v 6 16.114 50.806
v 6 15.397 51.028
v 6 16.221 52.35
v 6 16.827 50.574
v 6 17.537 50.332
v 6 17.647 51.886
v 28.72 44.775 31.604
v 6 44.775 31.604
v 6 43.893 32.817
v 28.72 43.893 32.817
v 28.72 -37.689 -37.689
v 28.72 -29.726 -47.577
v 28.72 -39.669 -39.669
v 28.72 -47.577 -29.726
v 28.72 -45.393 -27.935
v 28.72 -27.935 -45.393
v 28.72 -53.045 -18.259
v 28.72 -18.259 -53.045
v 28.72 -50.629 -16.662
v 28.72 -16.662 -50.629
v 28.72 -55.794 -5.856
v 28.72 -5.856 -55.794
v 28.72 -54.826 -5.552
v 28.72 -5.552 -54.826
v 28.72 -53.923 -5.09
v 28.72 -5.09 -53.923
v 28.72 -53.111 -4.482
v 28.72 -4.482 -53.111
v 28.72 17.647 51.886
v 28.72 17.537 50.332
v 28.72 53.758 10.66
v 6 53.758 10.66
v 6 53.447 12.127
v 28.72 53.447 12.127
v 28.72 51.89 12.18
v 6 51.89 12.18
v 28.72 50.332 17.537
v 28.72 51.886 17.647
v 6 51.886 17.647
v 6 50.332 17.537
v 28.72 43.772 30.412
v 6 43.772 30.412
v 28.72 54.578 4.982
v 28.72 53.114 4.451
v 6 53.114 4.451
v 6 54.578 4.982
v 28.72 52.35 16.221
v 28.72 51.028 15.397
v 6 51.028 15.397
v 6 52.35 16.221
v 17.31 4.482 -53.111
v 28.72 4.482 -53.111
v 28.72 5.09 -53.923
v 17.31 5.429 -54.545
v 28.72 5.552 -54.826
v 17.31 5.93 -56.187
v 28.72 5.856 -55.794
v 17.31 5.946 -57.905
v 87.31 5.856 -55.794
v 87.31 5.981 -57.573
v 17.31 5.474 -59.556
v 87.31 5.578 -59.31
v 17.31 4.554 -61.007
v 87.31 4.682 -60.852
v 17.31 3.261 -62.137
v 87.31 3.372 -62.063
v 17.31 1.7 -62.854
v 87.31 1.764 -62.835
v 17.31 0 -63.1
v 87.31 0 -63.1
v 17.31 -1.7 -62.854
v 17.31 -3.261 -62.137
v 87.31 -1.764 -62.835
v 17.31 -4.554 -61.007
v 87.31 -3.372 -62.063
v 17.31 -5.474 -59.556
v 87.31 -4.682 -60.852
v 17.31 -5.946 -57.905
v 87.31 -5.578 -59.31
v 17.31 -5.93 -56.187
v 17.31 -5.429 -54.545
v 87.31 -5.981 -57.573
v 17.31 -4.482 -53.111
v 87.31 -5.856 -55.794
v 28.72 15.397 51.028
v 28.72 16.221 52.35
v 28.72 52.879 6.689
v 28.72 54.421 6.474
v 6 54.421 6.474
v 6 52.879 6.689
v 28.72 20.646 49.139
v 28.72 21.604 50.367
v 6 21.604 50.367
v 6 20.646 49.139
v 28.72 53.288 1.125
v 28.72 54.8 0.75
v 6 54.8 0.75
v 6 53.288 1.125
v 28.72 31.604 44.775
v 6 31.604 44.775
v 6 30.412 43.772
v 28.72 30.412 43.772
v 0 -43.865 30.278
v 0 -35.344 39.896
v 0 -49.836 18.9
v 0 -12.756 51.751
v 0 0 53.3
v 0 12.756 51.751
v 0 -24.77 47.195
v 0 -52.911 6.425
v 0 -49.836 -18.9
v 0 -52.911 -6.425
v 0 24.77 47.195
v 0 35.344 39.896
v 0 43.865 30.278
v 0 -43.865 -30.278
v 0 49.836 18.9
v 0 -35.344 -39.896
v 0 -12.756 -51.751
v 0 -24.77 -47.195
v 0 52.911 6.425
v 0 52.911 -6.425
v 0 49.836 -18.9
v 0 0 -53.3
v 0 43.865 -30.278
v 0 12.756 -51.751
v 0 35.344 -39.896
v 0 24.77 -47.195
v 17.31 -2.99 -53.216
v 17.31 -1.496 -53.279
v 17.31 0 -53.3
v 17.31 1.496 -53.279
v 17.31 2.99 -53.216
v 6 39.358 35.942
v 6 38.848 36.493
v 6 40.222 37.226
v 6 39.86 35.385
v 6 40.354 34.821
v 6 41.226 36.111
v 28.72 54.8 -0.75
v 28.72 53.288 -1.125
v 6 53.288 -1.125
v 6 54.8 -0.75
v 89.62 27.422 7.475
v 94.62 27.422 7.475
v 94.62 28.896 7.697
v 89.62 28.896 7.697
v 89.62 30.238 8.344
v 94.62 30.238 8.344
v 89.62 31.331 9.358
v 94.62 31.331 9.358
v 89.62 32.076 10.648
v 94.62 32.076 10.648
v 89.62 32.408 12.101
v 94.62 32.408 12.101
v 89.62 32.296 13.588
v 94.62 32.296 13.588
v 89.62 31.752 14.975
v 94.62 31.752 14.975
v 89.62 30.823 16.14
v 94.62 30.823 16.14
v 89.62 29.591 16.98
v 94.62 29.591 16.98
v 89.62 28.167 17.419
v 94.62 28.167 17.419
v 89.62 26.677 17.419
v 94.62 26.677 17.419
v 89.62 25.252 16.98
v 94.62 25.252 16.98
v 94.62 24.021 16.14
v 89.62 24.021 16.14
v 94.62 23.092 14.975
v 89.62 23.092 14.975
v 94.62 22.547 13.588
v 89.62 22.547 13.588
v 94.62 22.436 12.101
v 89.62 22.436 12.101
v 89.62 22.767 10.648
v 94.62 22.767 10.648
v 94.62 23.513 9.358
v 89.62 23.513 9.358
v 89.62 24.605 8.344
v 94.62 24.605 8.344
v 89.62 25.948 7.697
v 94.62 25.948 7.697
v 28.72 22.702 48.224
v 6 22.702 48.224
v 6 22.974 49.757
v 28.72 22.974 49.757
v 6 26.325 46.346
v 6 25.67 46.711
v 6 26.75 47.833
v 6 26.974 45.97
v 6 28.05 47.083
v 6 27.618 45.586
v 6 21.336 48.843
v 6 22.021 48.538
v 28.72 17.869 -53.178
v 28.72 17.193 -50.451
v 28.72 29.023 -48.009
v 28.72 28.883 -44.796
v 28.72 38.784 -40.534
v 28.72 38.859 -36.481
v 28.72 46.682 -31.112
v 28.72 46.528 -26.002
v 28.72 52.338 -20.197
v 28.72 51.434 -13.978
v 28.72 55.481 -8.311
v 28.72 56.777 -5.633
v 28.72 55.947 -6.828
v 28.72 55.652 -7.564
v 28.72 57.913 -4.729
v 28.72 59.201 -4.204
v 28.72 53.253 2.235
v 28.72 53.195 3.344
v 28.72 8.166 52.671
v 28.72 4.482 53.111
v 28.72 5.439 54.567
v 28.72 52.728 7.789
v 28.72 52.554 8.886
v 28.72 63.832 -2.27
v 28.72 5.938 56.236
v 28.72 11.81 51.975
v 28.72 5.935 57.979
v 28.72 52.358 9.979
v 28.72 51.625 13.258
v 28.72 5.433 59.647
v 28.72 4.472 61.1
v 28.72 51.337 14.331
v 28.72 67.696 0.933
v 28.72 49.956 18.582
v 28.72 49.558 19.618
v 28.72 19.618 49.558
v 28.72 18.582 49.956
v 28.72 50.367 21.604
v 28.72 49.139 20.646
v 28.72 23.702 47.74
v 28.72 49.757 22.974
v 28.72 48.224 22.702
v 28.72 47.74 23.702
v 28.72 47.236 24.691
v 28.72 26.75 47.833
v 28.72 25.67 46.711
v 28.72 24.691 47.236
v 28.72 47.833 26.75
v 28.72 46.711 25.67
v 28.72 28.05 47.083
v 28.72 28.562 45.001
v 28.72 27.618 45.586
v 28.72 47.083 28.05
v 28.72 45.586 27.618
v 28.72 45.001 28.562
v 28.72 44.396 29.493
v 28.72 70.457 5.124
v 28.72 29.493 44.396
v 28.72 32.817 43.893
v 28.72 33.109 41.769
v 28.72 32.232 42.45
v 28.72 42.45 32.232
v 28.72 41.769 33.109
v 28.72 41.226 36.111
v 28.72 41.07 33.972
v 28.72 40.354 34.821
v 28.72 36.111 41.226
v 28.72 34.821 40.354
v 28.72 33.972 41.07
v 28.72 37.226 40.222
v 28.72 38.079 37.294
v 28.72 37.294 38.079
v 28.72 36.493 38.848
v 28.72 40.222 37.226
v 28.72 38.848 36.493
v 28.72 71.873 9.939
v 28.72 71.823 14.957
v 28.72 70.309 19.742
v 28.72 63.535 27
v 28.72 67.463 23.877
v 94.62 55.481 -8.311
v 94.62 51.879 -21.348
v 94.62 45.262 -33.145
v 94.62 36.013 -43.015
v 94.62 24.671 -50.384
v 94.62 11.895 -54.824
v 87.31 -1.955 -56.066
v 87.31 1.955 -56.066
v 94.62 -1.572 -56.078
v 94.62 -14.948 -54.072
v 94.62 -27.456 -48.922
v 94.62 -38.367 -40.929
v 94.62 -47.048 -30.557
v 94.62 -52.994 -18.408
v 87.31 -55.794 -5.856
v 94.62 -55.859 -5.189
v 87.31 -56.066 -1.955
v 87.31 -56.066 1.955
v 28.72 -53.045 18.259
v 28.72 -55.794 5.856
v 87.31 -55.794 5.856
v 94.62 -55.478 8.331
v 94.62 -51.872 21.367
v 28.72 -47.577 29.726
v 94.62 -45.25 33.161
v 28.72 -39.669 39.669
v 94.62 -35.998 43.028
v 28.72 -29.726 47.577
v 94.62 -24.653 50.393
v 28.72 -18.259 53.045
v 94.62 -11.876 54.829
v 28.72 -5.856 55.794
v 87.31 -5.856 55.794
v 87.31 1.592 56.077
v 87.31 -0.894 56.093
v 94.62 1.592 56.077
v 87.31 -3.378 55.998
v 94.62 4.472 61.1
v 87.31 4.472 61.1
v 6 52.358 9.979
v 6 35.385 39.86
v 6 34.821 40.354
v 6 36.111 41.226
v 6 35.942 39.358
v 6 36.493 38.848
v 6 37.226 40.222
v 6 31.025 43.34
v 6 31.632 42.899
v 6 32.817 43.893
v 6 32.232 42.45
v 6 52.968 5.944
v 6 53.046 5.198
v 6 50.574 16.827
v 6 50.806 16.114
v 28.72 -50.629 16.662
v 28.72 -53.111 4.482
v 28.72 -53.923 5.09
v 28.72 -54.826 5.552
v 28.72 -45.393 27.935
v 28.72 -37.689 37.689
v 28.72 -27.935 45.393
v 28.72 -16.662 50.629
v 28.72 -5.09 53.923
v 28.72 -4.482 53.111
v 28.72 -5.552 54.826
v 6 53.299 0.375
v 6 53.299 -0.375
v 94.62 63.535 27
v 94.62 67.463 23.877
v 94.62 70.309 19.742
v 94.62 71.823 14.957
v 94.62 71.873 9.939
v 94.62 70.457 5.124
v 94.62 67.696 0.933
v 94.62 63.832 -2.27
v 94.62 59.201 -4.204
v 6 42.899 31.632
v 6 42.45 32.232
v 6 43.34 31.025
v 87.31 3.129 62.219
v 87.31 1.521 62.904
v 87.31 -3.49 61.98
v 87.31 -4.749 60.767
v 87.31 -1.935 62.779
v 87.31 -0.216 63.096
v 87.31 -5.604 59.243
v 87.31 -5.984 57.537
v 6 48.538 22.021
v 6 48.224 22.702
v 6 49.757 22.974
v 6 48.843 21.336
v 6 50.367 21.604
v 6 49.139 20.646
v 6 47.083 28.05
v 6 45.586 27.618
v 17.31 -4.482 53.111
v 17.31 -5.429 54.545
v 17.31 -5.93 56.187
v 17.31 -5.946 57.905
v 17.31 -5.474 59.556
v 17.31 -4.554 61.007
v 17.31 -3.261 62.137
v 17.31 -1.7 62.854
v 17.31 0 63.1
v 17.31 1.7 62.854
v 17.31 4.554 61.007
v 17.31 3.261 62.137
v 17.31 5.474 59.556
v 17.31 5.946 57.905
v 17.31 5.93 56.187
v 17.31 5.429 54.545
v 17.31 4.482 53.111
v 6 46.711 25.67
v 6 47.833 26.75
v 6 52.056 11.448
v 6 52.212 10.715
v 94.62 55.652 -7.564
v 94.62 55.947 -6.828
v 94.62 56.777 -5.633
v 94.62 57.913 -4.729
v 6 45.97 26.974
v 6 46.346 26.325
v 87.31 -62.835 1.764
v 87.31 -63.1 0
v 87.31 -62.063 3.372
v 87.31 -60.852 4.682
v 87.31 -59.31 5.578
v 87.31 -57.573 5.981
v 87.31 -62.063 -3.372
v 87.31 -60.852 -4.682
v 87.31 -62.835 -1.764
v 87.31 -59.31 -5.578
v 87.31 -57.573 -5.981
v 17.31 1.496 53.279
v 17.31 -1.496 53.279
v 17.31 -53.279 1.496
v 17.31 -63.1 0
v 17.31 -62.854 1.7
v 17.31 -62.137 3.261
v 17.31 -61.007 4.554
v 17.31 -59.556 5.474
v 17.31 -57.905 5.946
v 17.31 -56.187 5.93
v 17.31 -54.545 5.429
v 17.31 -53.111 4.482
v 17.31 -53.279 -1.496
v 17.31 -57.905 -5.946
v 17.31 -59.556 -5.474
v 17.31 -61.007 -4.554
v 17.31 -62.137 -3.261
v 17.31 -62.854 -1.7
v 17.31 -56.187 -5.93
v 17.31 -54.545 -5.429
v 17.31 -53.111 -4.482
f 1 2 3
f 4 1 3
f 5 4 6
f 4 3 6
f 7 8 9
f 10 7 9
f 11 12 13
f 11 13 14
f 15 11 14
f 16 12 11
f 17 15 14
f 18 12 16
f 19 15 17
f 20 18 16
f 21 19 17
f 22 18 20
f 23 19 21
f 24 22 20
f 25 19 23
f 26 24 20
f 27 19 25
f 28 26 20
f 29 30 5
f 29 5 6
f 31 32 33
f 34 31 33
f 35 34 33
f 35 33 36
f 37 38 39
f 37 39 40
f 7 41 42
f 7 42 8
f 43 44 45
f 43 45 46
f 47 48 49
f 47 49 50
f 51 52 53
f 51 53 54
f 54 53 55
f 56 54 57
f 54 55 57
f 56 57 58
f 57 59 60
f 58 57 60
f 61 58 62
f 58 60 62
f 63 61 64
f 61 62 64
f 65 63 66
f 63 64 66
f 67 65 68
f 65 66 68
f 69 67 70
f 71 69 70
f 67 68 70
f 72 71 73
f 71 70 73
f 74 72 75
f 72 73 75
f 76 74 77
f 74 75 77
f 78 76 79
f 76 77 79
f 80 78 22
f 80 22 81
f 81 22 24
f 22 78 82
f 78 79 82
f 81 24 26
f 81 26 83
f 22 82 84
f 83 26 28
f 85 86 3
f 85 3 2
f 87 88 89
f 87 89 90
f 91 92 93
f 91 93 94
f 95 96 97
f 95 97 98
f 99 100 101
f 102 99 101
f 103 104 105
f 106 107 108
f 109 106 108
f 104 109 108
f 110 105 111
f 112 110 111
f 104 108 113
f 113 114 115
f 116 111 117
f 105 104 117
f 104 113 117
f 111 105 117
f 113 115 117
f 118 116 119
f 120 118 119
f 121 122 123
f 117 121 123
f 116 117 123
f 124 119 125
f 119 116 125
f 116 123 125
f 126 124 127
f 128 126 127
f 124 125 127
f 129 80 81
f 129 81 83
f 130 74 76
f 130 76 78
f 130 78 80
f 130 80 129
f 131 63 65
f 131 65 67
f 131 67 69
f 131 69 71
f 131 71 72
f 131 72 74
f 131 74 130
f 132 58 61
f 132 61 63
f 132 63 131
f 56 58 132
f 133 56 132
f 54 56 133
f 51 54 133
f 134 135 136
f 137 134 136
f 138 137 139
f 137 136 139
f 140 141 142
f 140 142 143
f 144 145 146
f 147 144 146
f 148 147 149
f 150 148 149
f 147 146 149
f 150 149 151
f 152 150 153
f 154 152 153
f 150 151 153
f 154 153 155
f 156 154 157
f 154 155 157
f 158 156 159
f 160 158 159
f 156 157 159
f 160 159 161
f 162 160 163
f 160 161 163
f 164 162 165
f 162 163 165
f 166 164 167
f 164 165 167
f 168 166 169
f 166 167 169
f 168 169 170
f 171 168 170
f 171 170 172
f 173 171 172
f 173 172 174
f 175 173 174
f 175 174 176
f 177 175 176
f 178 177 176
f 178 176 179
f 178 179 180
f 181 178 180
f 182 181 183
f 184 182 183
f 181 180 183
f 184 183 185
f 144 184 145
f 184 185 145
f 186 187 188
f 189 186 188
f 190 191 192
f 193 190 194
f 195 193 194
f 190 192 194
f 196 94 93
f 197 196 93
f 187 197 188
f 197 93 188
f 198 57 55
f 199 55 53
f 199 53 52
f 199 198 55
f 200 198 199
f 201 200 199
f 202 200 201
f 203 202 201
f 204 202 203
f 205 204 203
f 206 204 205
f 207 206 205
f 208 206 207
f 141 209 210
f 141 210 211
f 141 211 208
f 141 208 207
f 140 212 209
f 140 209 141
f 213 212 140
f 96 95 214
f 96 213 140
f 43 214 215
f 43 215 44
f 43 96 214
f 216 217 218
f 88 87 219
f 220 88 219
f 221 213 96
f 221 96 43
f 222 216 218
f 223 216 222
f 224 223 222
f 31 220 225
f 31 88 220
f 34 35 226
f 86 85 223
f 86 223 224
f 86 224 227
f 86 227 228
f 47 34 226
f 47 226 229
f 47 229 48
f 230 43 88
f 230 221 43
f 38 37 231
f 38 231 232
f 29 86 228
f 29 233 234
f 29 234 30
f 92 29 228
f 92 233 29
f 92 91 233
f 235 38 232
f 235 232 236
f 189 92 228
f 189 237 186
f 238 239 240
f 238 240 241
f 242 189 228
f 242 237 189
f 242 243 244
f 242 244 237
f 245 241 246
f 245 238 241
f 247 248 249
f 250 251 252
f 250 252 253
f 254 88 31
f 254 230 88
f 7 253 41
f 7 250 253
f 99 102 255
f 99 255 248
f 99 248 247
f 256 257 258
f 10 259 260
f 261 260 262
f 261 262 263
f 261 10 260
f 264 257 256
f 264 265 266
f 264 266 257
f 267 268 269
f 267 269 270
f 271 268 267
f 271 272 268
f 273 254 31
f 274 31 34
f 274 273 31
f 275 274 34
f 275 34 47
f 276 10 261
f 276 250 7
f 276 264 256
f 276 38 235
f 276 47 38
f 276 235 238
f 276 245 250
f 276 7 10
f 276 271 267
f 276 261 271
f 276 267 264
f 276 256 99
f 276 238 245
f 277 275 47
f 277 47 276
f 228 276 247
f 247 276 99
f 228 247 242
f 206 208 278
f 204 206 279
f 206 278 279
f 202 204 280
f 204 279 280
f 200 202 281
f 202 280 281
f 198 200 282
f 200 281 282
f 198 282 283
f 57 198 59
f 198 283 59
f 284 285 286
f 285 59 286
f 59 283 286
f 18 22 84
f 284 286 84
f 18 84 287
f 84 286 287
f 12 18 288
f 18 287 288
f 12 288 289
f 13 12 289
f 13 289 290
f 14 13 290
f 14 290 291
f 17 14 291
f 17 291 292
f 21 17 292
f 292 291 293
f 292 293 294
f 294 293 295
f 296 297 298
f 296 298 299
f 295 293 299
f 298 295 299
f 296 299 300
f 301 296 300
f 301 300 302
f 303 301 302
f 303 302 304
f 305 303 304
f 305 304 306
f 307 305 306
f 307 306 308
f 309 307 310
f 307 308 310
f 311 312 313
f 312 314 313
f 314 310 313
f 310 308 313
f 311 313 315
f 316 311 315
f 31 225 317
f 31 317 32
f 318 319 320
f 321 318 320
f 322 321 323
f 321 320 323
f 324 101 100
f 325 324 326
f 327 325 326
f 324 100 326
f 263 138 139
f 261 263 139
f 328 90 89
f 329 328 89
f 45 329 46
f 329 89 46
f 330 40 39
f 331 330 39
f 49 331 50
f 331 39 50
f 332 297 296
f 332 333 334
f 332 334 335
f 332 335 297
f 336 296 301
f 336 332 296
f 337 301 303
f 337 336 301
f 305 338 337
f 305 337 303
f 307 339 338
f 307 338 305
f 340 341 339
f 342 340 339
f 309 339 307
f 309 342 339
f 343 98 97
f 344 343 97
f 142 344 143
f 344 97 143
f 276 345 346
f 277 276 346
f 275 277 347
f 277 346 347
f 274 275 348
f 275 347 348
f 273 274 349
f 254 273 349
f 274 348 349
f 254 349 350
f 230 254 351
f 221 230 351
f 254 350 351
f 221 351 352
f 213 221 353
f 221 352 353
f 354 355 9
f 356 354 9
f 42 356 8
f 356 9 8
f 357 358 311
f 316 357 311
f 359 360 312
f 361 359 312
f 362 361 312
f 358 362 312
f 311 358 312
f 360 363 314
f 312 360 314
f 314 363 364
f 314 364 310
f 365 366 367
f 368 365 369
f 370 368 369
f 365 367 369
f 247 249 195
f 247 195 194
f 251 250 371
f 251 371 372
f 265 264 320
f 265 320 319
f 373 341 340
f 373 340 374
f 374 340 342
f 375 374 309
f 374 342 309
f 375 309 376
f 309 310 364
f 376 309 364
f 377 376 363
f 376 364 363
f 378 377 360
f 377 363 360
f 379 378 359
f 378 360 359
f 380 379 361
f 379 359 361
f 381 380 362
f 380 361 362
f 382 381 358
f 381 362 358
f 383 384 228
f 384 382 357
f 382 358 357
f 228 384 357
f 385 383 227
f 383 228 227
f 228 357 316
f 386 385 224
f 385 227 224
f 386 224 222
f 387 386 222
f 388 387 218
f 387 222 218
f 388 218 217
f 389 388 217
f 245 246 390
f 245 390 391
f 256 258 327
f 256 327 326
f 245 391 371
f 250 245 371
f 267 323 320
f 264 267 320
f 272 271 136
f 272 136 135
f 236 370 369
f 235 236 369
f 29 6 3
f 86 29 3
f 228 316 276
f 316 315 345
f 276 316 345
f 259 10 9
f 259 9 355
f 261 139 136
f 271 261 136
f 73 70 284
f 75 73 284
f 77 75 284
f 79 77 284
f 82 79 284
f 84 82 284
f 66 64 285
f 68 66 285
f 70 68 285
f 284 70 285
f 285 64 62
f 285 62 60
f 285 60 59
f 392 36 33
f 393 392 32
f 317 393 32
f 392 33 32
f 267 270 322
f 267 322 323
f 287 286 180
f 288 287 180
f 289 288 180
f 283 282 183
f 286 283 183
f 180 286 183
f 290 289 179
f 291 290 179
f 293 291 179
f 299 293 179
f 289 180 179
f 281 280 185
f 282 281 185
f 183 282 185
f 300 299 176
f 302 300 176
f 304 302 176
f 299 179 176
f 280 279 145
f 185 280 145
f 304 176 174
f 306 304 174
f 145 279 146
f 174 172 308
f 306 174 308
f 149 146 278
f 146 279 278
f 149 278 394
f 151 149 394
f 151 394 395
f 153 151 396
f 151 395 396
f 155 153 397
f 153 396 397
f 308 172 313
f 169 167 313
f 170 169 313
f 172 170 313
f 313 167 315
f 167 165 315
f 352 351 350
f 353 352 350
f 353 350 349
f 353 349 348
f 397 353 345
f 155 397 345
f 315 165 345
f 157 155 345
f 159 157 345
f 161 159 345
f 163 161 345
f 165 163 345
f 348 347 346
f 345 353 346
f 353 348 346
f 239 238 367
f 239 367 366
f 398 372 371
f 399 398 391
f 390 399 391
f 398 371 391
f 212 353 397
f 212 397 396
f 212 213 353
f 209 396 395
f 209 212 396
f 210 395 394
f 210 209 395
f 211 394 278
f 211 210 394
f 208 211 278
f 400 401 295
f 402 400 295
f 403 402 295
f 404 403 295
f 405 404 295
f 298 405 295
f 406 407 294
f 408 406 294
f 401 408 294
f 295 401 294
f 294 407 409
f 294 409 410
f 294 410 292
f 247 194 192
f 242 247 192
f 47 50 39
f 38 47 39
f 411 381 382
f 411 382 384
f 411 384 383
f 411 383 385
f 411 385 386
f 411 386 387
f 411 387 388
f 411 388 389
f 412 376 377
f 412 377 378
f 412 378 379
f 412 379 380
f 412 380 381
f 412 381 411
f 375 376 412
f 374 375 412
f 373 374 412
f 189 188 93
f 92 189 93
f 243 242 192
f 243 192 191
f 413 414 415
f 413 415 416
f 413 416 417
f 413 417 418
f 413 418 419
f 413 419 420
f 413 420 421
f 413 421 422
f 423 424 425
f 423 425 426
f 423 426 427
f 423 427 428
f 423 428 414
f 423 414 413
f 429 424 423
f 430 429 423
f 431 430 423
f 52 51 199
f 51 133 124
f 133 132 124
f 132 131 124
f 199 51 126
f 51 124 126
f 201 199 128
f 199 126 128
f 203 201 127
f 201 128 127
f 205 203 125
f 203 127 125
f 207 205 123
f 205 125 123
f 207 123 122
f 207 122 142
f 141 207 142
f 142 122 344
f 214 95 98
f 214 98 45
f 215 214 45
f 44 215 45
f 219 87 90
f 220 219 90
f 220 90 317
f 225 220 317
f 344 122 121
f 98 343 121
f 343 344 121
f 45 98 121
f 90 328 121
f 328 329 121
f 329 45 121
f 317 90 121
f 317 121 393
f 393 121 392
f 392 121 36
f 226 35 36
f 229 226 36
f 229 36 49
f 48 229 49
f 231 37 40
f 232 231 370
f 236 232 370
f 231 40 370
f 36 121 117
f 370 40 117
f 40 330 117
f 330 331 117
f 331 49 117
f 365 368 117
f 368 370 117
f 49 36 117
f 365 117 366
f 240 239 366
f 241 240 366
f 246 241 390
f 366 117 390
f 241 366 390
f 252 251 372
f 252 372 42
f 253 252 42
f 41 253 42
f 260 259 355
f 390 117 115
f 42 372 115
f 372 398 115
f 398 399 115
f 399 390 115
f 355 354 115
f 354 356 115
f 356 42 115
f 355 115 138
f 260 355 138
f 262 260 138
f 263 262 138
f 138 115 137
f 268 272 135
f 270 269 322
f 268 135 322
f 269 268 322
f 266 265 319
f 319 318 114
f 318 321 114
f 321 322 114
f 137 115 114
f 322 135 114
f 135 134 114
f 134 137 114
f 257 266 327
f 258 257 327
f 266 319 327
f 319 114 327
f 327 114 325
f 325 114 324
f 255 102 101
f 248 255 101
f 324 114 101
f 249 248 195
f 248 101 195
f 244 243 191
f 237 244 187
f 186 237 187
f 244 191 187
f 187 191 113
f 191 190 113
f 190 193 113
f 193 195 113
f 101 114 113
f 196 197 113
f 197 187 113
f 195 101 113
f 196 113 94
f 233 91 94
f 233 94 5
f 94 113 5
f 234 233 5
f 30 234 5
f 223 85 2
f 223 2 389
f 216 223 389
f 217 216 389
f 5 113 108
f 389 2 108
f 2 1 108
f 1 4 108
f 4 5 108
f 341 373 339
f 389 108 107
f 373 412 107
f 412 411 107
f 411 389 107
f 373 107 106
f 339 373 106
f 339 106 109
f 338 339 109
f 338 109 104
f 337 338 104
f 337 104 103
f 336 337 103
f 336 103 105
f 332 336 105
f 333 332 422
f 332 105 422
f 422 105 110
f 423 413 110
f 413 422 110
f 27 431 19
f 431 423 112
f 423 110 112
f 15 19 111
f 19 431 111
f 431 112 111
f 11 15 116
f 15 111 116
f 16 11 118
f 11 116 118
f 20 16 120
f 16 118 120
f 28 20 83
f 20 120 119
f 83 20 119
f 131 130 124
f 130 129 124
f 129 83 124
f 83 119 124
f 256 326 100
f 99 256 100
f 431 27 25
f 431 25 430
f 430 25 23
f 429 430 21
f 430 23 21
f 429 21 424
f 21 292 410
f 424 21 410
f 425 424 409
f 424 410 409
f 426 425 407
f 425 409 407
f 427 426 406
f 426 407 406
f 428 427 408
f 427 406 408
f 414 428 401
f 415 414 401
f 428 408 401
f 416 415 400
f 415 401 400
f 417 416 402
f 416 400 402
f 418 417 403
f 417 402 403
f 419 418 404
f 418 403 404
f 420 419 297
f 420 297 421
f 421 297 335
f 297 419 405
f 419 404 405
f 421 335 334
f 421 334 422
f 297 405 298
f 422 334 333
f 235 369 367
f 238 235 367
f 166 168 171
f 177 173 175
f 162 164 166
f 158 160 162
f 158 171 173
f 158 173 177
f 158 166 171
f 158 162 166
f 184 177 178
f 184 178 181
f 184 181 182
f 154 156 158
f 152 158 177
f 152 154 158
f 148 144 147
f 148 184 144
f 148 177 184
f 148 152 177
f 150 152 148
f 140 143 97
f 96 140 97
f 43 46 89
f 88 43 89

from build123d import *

# Parameters (mm, degrees)
SKETCH2_R           = 53.3
BOSS_EXTRUDE1_DEPTH = 94.62
BOSS_EXTRUDE2_DEPTH = 83
CIRPATTERN1_COUNT   = 13
CIRPATTERN1_ANGLE   = 72
BOSS_EXTRUDE3_START = -40
SKETCH5_R           = 6
BOSS_EXTRUDE3_DEPTH = 70
CIRPATTERN2_COUNT   = 3
CIRPATTERN2_ANGLE   = 180
SKETCH6_R           = 53.3
BOSS_EXTRUDE4_DEPTH = 65.9
FILLET2_R           = 5
SKETCH7_R           = 5
CUT_EXTRUDE1_DEPTH  = 5


with BuildPart() as part:
    # Sketch2 → Boss-Extrude1 (new body)
    with BuildSketch(Plane(origin=(0, 0, 0), x_dir=(0, 0, -1), z_dir=(1, 0, 0))):
        Circle(SKETCH2_R)
    extrude(amount=BOSS_EXTRUDE1_DEPTH)

    # Sketch4 → Boss-Extrude2 (add)
    with BuildSketch(Plane.ZY.offset(-6)):
        Polygon((-0.75, 54.8), (0.75, 54.8), (1.125, 53.288126023), (-1.125, 53.288126023), align=None)
    boss_extrude2 = extrude(amount=-BOSS_EXTRUDE2_DEPTH)

    # CirPattern1: Boss-Extrude2 ×13 about axis
    cirpattern1_axis = Axis((0, 0, 0), (1, 0, 0))
    for i in range(1, CIRPATTERN1_COUNT):
        add(boss_extrude2.rotate(cirpattern1_axis, i * CIRPATTERN1_ANGLE / (CIRPATTERN1_COUNT - 1)))

    # Sketch5 → Boss-Extrude3 (add)
    with BuildSketch(Plane.ZY.offset(-47.31).offset(BOSS_EXTRUDE3_START)):
        with Locations((-57.1, 0)):
            Circle(SKETCH5_R)
    boss_extrude3 = extrude(amount=BOSS_EXTRUDE3_DEPTH)

    # CirPattern2: Boss-Extrude3 ×3 about axis
    cirpattern2_axis = Axis((0, 0, 0), (-1, 0, 0))
    for i in range(1, CIRPATTERN2_COUNT):
        add(boss_extrude3.rotate(cirpattern2_axis, i * CIRPATTERN2_ANGLE / (CIRPATTERN2_COUNT - 1)))

    # Sketch6 → Boss-Extrude4 (add)
    with BuildSketch(Plane(origin=(94.62, 0, 0), x_dir=(0, 0, -1), z_dir=(1, 0, 0))):
        with BuildLine():
            Line((-61.1, 4.472135955), (-27, 63.535068493))
            ThreePointArc((-27, 63.535068493), (-8.298272765, 71.562778811), (4.70027417, 55.902749688))
            ThreePointArc((4.70027417, 55.902749688), (37.380543987, -41.831865022), (-56.077394681, 1.592421361))
            Line((-56.077394681, 1.592421361), (-61.1, 4.472135955))
        make_face()
        Circle(SKETCH6_R, mode=Mode.SUBTRACT)
    extrude(amount=-BOSS_EXTRUDE4_DEPTH)

    # Fillet2
    fillet2_edges = [part.edges().sort_by_distance(p)[0] for p in [
        (61.67, 55.902749688, -4.70027417),
    ]]
    fillet(fillet2_edges, radius=FILLET2_R)

    # Sketch7 → Cut-Extrude1 (cut)
    with BuildSketch(Plane(origin=(94.62, 0, 0), x_dir=(0, 0, -1), z_dir=(1, 0, 0))):
        with Locations((-12.475149036, 27.421809155)):
            Circle(SKETCH7_R)
    extrude(amount=-CUT_EXTRUDE1_DEPTH, mode=Mode.SUBTRACT)


solid = part.part
